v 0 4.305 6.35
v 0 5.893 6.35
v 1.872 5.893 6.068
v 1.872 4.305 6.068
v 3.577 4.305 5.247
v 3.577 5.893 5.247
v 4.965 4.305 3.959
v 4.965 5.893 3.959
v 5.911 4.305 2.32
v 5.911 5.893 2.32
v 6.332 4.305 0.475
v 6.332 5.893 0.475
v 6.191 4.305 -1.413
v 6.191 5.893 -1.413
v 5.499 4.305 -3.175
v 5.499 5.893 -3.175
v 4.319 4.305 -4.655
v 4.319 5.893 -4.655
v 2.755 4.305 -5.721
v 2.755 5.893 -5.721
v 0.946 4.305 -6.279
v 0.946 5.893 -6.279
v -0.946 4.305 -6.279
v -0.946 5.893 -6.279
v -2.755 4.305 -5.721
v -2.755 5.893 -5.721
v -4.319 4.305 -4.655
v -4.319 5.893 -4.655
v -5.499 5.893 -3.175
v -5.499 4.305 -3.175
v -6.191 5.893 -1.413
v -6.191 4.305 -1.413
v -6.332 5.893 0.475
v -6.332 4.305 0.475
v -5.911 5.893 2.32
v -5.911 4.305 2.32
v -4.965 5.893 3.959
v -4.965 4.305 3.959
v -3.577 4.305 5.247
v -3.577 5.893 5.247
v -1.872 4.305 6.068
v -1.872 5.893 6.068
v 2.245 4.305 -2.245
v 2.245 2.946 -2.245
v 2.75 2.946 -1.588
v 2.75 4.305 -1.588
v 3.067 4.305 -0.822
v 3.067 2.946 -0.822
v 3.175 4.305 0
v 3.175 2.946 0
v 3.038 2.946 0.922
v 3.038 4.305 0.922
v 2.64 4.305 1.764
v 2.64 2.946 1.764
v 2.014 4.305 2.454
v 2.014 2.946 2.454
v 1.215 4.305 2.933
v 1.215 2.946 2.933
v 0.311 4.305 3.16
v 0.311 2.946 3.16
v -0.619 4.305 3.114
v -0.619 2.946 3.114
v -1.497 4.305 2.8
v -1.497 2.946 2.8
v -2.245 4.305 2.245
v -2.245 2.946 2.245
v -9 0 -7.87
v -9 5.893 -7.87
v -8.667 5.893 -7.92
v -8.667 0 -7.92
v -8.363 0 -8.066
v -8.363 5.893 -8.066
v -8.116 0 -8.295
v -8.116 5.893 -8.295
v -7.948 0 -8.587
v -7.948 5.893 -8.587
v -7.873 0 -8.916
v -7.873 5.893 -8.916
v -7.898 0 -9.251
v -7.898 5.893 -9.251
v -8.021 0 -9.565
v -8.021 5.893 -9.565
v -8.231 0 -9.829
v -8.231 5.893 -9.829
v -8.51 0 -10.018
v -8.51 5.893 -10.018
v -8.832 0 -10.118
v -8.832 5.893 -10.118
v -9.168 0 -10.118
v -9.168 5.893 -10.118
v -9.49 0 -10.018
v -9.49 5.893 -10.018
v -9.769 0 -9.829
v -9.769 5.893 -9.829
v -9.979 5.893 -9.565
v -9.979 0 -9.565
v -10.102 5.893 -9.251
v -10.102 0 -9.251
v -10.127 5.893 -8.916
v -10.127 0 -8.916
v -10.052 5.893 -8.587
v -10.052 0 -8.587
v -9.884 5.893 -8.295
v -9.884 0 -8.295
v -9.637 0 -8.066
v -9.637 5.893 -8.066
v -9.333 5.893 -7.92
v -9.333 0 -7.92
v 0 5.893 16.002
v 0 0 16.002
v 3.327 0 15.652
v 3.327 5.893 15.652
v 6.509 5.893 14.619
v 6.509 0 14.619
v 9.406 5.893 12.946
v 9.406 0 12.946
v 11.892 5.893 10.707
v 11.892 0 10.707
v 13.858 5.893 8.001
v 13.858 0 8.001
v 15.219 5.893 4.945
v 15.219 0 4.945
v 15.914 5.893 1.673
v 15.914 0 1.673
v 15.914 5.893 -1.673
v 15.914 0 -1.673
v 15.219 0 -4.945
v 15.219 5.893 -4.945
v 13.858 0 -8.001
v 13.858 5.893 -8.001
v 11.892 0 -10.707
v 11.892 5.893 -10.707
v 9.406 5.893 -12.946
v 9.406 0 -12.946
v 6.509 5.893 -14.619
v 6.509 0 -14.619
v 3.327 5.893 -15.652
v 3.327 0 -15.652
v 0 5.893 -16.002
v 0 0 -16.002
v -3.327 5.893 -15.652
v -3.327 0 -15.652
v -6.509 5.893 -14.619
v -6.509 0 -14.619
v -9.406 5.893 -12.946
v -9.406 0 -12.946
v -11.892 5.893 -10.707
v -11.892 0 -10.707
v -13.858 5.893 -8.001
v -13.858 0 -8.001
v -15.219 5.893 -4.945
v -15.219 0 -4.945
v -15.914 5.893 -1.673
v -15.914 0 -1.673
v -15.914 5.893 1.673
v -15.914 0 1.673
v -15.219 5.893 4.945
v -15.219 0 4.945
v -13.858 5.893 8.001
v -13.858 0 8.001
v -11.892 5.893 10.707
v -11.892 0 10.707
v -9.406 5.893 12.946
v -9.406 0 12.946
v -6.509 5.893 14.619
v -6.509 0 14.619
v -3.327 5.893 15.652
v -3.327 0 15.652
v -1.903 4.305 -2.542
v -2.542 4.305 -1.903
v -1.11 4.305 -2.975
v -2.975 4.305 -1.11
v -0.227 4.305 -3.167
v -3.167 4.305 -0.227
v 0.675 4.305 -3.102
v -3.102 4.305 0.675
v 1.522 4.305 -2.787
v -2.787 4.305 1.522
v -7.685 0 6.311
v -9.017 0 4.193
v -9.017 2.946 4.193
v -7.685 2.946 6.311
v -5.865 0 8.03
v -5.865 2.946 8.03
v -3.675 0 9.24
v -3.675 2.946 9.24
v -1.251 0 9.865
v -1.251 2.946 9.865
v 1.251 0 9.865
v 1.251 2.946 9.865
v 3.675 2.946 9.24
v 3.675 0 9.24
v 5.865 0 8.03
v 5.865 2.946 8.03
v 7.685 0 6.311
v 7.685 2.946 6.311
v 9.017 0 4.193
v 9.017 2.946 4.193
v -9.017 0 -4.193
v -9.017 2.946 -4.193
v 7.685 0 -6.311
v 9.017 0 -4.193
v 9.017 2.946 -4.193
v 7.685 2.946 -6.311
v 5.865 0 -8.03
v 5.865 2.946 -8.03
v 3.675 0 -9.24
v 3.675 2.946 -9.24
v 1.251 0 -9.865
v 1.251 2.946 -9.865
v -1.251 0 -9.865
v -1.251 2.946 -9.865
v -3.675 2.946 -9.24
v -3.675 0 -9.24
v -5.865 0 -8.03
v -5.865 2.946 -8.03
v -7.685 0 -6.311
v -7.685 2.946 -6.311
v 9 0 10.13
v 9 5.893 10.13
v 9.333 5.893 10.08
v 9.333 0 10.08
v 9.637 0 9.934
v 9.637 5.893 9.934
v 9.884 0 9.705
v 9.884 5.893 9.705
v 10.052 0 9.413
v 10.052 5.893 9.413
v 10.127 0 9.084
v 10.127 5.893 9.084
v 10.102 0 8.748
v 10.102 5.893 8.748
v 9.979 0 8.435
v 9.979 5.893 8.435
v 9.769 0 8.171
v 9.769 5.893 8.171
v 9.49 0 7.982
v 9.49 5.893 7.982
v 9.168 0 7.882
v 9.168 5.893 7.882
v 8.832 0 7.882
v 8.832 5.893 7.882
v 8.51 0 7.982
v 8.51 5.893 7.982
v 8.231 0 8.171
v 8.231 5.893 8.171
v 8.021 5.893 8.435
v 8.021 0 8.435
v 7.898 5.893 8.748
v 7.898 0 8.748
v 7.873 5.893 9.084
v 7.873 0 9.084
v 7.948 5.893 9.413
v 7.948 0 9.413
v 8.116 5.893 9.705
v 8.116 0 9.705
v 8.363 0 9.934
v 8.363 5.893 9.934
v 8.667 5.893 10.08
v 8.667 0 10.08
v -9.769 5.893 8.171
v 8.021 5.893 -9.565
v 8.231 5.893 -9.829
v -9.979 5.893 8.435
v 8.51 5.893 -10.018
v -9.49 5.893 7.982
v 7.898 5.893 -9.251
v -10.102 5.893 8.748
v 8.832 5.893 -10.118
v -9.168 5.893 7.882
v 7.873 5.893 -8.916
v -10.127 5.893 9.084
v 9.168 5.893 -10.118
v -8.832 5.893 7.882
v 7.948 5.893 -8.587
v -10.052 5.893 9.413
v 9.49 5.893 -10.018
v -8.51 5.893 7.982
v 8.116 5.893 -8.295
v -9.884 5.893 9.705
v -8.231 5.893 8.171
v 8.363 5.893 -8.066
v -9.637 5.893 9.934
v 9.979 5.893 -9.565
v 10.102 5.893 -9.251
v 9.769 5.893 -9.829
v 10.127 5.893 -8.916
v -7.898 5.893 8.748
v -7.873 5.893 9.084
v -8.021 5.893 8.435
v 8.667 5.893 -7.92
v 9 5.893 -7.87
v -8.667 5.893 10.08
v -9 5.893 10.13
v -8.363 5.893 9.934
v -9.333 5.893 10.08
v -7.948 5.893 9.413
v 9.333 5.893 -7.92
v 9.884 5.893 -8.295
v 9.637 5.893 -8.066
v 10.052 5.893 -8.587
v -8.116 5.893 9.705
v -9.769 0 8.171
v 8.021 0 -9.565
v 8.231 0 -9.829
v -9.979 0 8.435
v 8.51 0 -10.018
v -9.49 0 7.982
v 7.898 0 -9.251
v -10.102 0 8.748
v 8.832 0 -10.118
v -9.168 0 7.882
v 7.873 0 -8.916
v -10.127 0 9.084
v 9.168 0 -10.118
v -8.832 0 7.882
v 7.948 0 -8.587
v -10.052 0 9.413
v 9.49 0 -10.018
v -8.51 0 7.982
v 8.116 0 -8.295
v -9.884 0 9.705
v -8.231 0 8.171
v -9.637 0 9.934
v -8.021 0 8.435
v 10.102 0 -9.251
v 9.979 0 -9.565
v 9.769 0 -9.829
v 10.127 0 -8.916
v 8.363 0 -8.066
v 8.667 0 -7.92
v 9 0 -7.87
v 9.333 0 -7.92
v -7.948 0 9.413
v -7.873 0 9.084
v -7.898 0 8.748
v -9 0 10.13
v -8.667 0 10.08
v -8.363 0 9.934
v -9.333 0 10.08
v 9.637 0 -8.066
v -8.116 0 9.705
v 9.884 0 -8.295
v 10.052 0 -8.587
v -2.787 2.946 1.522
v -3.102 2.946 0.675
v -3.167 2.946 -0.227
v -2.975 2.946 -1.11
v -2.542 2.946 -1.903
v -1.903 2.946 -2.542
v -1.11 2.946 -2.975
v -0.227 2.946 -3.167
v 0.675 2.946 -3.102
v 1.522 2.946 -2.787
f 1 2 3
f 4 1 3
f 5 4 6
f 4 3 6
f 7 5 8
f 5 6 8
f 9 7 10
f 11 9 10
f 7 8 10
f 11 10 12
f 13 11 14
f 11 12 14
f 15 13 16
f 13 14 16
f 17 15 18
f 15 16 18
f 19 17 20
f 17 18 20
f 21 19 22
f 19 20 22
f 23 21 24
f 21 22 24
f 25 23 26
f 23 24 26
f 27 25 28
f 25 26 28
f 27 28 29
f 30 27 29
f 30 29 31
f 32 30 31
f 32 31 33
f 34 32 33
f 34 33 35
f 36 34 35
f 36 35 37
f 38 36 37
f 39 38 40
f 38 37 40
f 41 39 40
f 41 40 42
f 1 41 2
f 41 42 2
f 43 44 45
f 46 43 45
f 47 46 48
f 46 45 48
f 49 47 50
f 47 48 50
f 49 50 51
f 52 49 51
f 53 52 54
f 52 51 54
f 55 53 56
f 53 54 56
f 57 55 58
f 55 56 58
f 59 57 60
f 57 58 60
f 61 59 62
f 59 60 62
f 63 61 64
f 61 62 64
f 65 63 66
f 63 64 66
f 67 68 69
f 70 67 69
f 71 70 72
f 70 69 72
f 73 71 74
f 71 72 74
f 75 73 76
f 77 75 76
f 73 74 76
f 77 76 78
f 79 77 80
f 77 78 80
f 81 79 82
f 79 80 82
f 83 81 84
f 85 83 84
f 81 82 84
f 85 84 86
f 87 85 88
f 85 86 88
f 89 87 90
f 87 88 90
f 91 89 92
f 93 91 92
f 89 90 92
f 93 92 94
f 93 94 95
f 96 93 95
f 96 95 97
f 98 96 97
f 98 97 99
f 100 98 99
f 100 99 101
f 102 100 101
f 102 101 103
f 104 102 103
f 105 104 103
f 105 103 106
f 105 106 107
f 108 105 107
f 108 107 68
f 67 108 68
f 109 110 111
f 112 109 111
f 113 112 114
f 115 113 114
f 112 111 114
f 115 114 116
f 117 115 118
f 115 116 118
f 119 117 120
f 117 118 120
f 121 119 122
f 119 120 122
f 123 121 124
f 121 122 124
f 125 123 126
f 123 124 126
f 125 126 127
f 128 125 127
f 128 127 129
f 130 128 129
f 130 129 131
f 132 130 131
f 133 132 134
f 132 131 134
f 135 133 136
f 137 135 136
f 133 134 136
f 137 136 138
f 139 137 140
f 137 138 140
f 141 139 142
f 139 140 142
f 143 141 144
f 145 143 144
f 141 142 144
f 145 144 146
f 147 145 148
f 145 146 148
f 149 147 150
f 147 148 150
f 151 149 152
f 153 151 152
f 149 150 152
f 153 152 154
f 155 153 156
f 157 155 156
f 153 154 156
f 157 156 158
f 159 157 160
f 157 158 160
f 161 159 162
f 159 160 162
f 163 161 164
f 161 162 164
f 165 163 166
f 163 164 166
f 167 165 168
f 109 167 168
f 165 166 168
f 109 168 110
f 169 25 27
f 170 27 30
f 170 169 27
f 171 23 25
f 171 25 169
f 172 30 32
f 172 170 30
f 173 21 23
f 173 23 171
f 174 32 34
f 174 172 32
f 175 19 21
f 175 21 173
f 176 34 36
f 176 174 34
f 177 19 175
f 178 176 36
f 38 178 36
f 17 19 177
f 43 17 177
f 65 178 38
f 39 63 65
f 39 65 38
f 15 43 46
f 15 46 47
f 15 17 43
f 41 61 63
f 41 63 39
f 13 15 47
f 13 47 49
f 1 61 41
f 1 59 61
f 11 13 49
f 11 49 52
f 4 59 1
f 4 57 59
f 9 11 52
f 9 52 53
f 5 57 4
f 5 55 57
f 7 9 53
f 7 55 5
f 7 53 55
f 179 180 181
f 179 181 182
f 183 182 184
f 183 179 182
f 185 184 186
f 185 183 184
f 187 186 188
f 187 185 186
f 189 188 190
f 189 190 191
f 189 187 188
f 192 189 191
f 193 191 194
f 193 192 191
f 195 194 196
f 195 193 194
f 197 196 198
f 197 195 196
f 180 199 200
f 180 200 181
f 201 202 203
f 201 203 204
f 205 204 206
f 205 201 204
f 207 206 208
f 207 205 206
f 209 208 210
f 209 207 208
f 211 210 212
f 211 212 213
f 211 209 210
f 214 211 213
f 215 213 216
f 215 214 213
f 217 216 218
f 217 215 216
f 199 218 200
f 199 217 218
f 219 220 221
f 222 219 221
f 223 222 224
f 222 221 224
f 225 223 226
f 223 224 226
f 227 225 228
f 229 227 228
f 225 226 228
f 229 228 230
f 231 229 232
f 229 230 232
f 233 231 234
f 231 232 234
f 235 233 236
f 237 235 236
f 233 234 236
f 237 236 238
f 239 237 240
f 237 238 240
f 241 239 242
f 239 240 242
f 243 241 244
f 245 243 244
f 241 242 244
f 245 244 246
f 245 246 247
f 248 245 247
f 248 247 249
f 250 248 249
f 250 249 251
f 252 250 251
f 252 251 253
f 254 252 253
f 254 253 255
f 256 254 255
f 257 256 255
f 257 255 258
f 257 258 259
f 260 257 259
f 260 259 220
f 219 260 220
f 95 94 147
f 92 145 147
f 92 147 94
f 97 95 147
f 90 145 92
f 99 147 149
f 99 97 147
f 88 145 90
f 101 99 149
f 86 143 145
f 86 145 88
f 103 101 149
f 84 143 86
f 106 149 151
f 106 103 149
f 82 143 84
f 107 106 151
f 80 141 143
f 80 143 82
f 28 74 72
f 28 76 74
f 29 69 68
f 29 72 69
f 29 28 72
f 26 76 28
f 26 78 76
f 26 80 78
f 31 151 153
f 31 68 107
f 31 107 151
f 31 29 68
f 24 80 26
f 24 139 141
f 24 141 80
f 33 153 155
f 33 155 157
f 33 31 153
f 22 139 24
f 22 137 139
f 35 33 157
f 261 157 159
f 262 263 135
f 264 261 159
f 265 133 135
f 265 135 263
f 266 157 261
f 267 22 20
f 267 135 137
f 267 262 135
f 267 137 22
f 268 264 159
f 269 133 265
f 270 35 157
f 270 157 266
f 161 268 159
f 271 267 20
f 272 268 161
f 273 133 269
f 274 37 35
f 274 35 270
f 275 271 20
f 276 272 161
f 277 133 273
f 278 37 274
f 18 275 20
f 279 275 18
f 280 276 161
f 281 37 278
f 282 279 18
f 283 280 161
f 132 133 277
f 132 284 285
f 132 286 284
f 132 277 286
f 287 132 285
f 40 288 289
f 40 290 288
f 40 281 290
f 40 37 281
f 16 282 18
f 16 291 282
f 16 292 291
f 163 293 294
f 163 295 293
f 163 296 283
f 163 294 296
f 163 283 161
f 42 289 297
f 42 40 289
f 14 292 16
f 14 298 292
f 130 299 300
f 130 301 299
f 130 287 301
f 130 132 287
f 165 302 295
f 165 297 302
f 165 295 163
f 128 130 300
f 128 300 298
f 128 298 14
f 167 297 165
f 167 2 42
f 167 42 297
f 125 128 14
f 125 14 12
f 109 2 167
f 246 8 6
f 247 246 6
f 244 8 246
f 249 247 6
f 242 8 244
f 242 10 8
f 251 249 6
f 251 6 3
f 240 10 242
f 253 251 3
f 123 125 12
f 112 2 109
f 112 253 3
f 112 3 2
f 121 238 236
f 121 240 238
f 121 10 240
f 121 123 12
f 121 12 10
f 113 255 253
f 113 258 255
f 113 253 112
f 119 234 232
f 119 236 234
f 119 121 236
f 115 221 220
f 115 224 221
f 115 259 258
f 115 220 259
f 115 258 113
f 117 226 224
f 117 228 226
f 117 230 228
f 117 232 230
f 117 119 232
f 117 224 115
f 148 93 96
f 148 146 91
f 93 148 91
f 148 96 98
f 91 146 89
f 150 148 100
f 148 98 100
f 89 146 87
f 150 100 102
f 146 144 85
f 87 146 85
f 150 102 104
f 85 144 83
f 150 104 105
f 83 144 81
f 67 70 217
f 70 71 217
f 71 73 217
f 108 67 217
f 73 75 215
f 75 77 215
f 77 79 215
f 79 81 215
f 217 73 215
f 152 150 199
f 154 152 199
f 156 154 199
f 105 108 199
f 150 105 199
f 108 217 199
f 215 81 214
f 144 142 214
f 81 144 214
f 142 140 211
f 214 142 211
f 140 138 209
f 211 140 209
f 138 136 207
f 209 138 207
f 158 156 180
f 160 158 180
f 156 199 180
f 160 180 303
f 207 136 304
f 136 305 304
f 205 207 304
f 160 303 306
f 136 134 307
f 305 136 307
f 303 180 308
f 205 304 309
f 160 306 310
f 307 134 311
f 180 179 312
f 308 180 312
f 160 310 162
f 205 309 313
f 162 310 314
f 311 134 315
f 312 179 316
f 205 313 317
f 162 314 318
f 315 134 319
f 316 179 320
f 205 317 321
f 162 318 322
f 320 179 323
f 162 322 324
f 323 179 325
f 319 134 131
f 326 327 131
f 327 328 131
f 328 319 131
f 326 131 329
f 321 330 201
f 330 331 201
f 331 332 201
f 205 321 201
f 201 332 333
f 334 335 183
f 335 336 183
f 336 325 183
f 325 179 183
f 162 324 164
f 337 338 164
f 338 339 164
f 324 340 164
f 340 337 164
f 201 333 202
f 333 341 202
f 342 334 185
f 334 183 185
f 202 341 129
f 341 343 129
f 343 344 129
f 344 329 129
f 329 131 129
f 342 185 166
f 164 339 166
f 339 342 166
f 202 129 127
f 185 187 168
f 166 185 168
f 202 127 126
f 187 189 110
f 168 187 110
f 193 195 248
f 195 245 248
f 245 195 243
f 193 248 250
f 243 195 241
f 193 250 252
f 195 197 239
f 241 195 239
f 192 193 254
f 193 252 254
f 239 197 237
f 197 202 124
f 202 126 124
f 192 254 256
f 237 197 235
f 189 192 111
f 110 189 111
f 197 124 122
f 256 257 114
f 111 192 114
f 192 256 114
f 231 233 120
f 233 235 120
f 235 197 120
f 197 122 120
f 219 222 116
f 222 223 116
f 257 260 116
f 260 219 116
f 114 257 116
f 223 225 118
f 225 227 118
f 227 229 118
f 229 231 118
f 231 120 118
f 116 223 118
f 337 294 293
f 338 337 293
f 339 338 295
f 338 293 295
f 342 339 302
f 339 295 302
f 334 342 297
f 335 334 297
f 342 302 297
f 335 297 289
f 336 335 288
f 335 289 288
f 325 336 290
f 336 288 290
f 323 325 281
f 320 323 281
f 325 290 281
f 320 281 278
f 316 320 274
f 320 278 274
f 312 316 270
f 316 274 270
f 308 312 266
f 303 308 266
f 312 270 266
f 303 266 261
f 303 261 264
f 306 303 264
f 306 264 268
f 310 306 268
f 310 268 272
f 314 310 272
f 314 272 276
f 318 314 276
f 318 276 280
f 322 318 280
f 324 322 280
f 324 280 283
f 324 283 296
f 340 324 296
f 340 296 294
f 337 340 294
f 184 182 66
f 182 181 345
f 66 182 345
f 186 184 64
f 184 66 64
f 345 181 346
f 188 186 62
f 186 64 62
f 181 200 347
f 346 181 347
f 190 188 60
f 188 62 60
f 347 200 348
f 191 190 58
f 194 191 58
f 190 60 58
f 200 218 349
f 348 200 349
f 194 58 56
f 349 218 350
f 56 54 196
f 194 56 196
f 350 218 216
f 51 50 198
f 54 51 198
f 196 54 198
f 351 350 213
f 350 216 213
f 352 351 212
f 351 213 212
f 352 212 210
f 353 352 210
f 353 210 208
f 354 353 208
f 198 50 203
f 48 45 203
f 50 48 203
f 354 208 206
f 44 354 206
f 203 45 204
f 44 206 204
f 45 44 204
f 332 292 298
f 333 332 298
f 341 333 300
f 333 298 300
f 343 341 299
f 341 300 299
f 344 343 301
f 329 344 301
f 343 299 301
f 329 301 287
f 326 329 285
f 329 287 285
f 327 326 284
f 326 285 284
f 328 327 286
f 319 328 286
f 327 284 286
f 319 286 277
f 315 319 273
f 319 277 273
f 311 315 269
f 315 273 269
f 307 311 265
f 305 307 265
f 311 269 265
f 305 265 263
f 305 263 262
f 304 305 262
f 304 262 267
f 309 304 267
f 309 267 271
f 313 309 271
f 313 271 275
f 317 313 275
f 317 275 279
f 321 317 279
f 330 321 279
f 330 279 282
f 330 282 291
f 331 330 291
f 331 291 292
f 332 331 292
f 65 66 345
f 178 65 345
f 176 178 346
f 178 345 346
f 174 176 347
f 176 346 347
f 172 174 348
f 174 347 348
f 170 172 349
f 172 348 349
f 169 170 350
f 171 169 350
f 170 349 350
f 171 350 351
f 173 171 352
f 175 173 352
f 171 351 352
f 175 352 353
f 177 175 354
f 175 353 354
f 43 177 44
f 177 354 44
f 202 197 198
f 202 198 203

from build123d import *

# Parameters (mm, degrees)
SKETCH2_R             = 16.002
BOSS_EXTRUDE2_DEPTH   = 5.8928
CUT_EXTRUDE1_DEPTH    = 2.9464
F_4_40_TAPPED_HOLE1_D = 2.2606
SKETCH3_R             = 3.175
CUT_EXTRUDE2_DEPTH    = 24.384890418
SKETCH5_R             = 6.35
CUT_EXTRUDE3_DEPTH    = 1.5875


with BuildPart() as part:
    # Sketch2 → Boss-Extrude2 (new body)
    with BuildSketch(Plane(origin=(0, 0, 0), x_dir=(1, 0, 0), z_dir=(0, 1, 0))):
        Circle(SKETCH2_R)
    extrude(amount=BOSS_EXTRUDE2_DEPTH)

    # Sketch2<3> → Cut-Extrude1 (cut)
    with BuildSketch(Plane(origin=(0, 0, 0), x_dir=(1, 0, 0), z_dir=(0, 1, 0))):
        with BuildLine():
            ThreePointArc((9.017, 4.192712226), (0, 9.9441), (-9.017, 4.192712226))
            Line((-9.017, 4.192712226), (-9.017, -4.192712226))
            ThreePointArc((-9.017, -4.192712226), (0, -9.9441), (9.017, -4.192712226))
            Line((9.017, -4.192712226), (9.017, 4.192712226))
        make_face()
    extrude(amount=CUT_EXTRUDE1_DEPTH, mode=Mode.SUBTRACT)

    # #4-40 Tapped Hole1 (through all)
    with Locations(Plane(origin=(-8.999982, 0, 8.999982), x_dir=(0, 0, -1), z_dir=(0, -1, 0))):
        with Locations((0, 0), (0, 17.999964), (17.999964, 17.999964), (17.999964, 0)):
            Hole(F_4_40_TAPPED_HOLE1_D / 2)

    # Sketch3 → Cut-Extrude2 (cut, through all)
    with BuildSketch(Plane.XZ):
        Circle(SKETCH3_R)
    extrude(amount=-CUT_EXTRUDE2_DEPTH, mode=Mode.SUBTRACT)

    # Sketch5 → Cut-Extrude3 (cut)
    with BuildSketch(Plane(origin=(0, 5.8928, 0), x_dir=(1, 0, 0), z_dir=(0, 1, 0))):
        Circle(SKETCH5_R)
    extrude(amount=-CUT_EXTRUDE3_DEPTH, mode=Mode.SUBTRACT)


solid = part.part
